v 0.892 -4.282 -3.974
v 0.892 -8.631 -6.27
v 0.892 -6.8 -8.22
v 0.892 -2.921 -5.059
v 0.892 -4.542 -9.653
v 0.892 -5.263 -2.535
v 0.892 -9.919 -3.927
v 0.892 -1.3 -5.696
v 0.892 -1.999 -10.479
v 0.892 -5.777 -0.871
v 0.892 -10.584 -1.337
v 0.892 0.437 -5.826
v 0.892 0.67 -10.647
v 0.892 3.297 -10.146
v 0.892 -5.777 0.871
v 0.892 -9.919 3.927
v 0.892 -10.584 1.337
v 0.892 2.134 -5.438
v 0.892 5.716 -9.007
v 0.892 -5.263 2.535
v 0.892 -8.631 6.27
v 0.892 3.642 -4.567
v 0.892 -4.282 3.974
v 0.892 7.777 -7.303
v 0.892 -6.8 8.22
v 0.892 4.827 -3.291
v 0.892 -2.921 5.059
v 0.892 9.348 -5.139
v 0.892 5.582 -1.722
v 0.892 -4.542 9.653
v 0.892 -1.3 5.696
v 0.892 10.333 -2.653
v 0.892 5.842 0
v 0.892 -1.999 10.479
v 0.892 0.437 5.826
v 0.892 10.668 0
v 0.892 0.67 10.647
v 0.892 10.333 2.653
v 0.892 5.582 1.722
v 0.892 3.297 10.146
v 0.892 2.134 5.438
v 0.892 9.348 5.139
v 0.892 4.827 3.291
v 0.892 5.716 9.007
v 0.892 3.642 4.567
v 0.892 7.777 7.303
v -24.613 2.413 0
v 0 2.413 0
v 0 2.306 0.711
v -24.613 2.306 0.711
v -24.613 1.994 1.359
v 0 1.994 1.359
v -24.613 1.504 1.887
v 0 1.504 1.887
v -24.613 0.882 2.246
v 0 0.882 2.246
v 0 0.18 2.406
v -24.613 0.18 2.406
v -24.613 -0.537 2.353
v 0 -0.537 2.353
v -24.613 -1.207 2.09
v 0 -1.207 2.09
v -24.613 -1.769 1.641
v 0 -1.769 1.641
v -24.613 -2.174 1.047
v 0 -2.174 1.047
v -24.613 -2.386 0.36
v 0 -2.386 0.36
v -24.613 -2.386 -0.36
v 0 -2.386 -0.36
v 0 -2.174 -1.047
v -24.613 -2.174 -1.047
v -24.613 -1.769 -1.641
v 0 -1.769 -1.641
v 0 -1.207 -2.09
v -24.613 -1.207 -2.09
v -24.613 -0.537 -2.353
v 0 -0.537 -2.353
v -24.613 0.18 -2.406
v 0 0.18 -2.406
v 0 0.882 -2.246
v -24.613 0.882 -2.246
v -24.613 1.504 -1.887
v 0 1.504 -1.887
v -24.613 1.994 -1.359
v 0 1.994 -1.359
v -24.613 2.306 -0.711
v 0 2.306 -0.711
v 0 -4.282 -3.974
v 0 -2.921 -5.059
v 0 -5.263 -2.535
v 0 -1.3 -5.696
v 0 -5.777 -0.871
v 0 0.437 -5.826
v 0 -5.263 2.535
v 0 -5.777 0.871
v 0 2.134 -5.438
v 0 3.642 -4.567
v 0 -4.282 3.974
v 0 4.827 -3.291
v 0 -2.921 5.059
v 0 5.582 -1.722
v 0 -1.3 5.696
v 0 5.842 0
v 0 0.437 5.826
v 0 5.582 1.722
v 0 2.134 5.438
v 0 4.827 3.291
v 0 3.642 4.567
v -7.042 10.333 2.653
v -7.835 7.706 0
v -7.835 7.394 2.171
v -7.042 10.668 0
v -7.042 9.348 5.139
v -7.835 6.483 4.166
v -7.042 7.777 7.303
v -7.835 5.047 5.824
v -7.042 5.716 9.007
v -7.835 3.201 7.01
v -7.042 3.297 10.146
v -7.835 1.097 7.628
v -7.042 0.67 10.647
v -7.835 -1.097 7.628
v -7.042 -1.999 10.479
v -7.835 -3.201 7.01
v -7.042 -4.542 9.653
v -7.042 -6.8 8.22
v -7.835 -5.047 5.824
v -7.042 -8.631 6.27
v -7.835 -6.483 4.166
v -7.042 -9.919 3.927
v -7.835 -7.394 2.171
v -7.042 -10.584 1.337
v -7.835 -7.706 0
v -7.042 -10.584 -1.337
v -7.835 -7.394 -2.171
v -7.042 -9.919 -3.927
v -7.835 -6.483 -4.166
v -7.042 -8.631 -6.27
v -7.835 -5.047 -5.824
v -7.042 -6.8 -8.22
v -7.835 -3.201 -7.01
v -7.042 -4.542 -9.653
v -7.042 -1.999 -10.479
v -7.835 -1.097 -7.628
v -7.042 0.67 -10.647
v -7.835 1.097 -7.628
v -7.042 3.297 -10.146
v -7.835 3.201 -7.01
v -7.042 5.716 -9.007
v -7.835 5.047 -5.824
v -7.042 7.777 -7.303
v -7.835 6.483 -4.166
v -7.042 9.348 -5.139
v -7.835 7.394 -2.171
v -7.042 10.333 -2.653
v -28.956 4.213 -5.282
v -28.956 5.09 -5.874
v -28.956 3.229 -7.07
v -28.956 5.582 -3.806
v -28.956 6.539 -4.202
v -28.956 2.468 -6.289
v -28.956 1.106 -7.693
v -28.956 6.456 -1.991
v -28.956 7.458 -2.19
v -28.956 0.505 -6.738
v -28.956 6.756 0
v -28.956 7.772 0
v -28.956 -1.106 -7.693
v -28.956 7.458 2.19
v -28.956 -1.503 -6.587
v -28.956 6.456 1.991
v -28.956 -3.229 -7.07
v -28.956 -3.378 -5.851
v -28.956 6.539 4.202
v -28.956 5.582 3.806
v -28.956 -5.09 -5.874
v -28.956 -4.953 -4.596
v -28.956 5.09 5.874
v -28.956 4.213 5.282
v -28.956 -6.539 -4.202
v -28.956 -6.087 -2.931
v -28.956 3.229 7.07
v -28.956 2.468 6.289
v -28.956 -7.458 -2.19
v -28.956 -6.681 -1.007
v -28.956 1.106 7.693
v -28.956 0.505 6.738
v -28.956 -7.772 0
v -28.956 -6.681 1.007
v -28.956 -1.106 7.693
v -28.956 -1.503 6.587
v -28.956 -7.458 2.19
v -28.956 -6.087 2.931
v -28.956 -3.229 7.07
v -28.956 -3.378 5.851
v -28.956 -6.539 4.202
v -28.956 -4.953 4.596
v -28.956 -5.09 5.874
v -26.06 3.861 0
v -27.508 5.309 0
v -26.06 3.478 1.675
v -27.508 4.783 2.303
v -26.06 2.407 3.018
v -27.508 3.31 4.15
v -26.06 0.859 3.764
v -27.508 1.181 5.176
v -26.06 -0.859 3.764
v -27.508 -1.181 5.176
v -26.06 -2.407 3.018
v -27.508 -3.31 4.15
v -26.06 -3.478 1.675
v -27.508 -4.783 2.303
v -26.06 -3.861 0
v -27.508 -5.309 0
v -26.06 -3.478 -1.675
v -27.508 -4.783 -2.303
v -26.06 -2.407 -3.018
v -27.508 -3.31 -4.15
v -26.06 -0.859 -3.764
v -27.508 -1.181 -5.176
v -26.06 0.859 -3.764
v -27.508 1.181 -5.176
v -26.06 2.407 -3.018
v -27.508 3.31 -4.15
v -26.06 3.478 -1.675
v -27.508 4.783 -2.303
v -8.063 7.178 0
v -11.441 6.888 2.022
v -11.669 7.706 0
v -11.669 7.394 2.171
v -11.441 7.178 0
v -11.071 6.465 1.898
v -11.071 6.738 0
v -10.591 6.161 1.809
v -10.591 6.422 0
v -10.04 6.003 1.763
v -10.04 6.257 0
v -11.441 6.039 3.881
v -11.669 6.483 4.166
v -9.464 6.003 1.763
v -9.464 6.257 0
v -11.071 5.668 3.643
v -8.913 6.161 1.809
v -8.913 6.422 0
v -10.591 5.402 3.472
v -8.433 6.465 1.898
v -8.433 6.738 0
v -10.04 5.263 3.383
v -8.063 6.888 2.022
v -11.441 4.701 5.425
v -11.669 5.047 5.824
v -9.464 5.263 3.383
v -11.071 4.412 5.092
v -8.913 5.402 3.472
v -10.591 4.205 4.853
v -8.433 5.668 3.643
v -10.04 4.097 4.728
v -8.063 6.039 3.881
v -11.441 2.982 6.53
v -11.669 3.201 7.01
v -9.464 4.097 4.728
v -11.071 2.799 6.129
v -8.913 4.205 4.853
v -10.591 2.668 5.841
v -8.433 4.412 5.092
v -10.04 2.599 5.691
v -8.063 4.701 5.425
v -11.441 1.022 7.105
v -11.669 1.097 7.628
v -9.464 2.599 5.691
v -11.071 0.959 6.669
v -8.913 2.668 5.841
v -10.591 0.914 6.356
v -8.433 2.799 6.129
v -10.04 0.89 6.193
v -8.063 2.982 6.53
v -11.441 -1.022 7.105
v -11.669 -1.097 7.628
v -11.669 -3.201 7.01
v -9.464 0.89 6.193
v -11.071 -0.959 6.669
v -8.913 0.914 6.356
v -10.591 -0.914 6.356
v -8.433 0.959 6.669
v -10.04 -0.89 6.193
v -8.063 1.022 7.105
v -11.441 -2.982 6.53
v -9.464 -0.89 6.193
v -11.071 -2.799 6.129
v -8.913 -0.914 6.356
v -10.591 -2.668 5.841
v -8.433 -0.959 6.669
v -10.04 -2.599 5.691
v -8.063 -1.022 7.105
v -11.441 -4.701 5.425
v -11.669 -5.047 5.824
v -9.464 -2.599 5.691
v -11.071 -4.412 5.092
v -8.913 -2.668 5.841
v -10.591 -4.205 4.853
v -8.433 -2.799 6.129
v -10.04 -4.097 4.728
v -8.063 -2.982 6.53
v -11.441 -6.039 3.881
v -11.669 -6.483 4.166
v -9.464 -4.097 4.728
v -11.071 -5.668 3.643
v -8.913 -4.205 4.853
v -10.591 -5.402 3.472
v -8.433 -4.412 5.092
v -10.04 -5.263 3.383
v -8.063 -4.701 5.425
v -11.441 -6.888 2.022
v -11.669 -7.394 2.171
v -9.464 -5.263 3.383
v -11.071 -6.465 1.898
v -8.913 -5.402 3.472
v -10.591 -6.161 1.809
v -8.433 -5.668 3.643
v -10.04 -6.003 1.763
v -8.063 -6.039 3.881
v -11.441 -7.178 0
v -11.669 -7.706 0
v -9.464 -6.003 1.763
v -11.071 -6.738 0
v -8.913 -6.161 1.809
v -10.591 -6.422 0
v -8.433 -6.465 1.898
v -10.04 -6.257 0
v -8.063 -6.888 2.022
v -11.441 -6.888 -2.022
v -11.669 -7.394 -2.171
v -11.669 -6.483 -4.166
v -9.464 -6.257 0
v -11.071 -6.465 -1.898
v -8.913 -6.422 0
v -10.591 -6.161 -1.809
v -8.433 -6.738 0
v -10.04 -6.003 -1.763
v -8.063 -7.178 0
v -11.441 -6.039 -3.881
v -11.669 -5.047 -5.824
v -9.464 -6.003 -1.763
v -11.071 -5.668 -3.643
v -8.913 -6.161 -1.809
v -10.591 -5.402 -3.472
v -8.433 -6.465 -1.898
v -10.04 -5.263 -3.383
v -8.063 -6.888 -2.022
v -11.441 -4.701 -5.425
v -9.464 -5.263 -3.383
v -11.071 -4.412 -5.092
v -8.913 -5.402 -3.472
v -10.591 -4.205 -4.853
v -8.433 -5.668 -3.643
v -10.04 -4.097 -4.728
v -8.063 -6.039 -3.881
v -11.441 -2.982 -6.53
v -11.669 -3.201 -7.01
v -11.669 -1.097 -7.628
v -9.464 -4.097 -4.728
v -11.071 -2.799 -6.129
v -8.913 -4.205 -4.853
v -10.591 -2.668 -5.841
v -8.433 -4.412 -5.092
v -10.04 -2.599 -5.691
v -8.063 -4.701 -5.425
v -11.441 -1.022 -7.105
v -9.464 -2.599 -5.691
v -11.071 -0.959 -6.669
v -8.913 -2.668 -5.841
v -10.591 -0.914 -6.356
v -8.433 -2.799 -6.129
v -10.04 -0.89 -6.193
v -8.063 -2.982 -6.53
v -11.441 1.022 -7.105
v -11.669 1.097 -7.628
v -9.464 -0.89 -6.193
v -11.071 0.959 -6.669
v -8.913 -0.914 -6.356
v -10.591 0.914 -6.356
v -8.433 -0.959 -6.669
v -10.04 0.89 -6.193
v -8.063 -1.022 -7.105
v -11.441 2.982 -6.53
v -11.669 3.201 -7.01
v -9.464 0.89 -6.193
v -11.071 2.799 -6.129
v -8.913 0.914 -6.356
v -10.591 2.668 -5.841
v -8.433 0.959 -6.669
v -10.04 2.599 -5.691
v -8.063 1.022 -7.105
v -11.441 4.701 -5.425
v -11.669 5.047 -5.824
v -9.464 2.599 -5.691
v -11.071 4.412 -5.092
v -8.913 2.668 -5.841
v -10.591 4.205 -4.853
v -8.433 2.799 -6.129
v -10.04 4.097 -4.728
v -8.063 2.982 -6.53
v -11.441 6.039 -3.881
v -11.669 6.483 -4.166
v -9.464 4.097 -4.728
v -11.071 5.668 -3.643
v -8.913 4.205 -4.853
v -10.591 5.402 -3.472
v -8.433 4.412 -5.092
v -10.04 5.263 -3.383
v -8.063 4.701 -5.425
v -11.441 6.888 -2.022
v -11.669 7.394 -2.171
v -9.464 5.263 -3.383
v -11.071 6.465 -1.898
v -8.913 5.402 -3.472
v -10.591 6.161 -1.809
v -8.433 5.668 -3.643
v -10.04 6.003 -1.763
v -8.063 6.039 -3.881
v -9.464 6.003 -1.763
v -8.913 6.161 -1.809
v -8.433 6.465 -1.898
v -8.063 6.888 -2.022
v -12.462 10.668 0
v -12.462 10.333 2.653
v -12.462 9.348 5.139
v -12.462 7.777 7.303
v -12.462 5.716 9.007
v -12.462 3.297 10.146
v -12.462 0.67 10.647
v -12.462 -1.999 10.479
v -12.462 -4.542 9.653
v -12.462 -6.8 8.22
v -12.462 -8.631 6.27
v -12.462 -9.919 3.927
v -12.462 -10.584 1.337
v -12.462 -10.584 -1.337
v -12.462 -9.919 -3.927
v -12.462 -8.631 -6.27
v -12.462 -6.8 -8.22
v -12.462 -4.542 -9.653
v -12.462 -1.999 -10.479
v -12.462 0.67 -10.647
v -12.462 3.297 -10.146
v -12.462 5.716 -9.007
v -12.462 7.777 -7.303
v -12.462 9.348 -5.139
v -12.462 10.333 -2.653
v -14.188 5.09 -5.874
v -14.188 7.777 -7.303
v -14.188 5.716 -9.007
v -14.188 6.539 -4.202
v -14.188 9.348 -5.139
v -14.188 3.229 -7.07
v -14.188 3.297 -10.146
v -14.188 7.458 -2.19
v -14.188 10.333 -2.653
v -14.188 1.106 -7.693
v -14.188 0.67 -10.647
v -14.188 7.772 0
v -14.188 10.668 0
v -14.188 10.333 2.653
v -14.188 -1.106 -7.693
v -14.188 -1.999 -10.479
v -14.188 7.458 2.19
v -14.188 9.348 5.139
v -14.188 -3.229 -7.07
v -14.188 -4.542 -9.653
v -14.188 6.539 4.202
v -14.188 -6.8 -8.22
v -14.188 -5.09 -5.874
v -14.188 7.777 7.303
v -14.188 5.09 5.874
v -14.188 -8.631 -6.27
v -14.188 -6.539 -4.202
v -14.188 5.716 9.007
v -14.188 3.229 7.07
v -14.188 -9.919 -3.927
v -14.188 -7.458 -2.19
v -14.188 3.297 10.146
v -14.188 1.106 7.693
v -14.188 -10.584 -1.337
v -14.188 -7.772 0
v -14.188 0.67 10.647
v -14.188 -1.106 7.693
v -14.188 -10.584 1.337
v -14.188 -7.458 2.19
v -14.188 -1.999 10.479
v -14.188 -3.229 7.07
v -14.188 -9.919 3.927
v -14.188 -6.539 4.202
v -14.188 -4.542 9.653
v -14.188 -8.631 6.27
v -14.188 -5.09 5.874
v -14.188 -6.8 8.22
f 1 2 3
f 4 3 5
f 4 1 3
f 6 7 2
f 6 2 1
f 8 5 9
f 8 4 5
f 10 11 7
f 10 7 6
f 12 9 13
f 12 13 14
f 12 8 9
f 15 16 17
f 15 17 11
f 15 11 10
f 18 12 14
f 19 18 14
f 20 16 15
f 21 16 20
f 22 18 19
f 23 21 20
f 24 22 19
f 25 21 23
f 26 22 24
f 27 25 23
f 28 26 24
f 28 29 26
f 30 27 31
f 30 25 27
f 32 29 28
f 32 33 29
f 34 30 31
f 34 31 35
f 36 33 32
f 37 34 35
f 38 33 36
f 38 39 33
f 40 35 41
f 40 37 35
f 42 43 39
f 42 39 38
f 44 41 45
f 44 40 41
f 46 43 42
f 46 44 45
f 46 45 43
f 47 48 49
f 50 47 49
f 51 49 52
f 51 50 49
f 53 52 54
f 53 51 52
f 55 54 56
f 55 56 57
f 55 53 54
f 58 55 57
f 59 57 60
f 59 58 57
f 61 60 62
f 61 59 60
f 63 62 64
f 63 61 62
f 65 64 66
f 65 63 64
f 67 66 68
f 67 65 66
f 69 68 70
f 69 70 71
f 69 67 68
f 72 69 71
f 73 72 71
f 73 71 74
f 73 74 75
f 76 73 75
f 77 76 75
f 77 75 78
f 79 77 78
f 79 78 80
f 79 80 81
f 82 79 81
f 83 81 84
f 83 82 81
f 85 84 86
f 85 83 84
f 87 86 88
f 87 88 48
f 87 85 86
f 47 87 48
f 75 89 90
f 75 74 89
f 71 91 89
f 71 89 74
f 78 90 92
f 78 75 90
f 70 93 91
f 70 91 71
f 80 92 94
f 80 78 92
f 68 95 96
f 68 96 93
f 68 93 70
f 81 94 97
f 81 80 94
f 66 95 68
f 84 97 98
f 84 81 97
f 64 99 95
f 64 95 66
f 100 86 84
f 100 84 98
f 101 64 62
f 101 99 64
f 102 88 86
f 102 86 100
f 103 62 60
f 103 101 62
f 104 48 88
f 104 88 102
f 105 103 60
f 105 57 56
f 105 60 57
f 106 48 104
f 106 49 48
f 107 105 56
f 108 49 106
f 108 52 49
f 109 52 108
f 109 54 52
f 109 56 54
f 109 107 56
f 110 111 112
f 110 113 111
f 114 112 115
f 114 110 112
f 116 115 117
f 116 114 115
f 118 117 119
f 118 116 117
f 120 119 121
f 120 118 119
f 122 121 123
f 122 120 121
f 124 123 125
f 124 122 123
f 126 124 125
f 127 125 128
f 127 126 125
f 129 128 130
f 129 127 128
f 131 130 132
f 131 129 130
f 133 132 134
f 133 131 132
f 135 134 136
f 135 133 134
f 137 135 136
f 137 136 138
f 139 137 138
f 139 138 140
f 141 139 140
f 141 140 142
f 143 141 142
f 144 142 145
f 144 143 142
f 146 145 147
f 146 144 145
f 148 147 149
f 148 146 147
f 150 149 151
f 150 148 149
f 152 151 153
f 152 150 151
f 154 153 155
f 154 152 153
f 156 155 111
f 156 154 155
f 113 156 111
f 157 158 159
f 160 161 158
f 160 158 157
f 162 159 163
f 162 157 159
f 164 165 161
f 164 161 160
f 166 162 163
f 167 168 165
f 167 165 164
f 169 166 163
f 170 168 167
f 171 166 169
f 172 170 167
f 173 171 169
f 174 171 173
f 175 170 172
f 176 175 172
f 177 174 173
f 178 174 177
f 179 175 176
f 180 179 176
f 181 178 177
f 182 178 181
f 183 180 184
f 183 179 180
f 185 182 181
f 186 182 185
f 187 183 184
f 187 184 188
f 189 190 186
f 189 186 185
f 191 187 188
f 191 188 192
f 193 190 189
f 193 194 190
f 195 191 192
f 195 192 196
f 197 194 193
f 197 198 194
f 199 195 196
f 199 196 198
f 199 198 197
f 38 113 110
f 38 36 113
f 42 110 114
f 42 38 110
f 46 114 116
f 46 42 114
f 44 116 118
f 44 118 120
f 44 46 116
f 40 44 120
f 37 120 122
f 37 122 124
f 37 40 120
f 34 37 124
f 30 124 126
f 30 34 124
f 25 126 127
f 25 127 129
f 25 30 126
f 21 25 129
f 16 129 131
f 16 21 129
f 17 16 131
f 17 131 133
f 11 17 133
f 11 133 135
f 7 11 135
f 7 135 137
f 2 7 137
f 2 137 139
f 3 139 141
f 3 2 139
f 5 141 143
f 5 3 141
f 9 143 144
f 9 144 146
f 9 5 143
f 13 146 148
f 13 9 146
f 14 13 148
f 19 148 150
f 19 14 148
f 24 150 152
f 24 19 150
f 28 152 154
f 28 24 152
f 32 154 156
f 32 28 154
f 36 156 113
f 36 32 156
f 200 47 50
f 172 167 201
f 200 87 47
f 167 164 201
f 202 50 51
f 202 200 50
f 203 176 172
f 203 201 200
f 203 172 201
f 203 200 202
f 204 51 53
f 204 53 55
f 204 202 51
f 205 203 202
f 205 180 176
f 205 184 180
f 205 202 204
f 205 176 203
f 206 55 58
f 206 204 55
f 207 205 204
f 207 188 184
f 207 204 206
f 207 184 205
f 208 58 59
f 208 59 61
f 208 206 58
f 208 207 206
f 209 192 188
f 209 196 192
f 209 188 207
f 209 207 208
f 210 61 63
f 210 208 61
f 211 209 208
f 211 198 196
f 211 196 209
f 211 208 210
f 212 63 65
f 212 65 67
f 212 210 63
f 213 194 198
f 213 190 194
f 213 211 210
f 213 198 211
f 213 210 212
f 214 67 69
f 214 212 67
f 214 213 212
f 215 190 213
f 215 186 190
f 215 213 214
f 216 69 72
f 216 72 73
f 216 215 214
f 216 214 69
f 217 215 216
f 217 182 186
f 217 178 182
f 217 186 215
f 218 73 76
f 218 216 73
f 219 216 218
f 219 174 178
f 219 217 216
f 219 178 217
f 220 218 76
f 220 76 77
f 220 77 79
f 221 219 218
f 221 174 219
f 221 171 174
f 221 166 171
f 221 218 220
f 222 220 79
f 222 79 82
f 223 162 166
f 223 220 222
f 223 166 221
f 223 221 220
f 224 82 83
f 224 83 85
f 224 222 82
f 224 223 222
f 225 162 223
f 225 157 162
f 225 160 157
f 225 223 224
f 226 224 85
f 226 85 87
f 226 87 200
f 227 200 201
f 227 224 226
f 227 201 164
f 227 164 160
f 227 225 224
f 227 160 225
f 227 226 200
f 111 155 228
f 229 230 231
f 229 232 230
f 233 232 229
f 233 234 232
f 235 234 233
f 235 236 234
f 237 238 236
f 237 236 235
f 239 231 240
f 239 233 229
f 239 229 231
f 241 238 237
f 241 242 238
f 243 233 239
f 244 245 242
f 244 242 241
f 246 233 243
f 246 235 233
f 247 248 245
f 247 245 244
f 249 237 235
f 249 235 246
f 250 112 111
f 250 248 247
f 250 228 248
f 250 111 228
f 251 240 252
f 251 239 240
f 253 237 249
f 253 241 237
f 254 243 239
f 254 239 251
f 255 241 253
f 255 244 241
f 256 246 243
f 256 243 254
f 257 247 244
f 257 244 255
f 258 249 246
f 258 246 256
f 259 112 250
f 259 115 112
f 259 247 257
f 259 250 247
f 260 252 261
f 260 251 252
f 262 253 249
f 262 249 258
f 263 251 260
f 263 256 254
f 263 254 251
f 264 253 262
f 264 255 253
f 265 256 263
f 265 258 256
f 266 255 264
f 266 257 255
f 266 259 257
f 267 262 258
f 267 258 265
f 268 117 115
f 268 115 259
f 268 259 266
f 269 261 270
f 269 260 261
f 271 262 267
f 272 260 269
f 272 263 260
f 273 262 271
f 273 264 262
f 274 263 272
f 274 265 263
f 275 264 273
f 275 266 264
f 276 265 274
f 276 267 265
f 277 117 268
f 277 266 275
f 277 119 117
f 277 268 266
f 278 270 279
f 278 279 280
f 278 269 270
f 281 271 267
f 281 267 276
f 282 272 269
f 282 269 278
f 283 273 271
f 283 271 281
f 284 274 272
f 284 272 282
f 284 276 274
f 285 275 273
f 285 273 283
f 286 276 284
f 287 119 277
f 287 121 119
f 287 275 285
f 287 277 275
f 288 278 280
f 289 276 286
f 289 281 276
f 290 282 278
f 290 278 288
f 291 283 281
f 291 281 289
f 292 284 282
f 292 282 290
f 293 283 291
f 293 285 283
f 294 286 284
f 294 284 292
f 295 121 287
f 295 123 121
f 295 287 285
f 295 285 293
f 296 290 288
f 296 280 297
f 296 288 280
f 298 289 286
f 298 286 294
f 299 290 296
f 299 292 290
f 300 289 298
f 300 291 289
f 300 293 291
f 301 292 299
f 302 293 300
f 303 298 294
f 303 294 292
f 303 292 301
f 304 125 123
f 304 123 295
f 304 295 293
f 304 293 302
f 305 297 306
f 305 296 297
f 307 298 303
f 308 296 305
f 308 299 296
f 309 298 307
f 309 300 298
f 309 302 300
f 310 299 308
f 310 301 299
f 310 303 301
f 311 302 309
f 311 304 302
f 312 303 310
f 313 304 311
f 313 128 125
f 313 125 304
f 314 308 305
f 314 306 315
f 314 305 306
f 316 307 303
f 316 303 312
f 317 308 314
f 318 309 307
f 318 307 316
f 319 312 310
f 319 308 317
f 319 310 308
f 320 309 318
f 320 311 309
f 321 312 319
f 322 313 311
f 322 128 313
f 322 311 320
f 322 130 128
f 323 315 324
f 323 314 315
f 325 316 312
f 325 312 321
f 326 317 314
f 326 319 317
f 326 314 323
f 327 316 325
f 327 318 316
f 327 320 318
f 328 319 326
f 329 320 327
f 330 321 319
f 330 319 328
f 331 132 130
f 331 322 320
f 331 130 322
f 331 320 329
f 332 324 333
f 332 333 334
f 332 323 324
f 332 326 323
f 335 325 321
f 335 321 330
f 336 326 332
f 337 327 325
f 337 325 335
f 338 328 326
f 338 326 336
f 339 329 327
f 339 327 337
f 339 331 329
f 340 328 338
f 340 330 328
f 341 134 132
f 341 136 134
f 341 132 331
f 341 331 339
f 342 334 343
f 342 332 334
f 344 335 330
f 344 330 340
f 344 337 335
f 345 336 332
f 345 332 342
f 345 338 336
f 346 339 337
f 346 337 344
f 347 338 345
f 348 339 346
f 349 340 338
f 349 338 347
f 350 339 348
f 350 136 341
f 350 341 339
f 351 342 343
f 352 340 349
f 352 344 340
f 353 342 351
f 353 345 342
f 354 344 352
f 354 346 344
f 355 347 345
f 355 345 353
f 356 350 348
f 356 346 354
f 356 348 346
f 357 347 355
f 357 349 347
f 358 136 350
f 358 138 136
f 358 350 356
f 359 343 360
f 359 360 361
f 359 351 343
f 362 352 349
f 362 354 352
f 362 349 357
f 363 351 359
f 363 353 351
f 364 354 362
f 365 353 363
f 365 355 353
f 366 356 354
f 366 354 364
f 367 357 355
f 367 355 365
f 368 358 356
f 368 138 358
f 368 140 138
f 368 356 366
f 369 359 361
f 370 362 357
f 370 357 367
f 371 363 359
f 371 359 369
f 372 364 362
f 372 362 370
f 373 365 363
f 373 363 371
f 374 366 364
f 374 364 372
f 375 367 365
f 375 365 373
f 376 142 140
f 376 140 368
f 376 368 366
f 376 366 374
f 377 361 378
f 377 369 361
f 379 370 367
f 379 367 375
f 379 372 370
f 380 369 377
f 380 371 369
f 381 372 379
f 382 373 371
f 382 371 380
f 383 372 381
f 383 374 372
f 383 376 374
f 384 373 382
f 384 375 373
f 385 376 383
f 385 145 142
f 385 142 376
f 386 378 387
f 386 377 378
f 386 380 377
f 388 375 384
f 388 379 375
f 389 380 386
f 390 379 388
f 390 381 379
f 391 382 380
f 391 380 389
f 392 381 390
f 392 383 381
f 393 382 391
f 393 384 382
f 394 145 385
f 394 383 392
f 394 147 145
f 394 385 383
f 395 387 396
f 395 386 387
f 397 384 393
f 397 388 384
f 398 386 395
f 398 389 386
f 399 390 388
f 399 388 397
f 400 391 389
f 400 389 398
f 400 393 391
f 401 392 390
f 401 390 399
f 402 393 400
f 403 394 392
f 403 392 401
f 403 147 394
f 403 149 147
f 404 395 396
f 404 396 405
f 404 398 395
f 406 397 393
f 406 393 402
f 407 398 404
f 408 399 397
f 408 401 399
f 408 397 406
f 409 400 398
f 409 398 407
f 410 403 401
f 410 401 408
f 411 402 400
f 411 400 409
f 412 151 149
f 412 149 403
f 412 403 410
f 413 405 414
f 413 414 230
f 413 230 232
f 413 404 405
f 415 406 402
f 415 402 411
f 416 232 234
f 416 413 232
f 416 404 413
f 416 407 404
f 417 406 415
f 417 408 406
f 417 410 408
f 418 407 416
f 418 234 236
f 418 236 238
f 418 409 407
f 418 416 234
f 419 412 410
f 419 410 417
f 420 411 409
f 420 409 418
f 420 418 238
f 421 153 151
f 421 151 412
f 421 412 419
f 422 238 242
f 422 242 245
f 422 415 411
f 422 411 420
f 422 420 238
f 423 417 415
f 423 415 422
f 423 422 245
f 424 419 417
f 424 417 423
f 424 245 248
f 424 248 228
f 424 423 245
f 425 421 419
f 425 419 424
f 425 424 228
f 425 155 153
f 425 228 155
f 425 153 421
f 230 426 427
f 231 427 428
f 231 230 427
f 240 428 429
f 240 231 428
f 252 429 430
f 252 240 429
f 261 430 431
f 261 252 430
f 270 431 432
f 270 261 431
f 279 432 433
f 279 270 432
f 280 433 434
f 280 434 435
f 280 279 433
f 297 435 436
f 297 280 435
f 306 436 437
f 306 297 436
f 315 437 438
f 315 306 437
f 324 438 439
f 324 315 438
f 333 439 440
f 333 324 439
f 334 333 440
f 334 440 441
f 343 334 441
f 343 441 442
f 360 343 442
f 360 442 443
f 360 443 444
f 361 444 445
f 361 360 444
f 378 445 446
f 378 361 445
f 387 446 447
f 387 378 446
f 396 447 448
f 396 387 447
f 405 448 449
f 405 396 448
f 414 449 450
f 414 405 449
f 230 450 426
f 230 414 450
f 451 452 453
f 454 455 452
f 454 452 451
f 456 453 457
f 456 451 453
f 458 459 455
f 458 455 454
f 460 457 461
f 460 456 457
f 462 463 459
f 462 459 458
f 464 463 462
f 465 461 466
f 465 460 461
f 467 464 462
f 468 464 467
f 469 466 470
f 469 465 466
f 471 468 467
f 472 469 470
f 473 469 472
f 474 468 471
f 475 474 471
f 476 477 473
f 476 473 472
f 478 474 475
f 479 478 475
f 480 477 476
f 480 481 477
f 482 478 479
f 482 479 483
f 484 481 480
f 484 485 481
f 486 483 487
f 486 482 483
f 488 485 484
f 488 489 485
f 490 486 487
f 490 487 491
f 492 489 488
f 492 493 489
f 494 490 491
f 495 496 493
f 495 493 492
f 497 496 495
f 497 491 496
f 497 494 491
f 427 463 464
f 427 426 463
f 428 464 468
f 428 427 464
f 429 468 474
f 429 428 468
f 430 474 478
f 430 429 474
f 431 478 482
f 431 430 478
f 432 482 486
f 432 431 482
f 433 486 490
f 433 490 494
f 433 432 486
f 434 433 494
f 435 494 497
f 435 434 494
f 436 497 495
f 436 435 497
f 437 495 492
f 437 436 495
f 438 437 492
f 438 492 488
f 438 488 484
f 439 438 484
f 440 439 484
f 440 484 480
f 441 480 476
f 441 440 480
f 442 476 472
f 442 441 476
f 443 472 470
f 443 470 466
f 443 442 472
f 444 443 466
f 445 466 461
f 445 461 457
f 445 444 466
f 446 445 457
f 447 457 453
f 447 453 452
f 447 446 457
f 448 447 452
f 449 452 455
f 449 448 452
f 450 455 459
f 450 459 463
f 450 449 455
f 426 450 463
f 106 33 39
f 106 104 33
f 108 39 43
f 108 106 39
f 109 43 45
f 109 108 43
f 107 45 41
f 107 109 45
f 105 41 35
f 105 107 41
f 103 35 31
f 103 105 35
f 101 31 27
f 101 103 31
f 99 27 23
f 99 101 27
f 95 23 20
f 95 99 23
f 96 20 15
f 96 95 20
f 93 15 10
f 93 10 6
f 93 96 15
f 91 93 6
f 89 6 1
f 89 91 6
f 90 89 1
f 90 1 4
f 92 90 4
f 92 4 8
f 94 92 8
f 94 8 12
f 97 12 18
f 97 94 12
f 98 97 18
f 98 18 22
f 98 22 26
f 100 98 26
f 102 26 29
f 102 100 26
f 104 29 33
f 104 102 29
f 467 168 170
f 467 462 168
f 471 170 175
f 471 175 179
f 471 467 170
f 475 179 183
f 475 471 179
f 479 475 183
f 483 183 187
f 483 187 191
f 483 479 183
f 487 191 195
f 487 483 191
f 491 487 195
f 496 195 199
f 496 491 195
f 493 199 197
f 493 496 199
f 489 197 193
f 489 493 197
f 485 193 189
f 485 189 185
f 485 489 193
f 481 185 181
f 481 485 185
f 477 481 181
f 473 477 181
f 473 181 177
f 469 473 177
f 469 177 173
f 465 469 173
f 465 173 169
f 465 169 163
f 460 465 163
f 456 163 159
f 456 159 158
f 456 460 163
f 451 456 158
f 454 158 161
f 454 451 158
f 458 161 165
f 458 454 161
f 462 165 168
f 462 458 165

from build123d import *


with BuildPart() as part:
    # Sketch1 → Revolve1 (revolve)
    with BuildSketch(Plane.XY):
        with BuildLine():
            Line((-7.83533025, 7.706480957), (-7.041793614, 10.668))
            Line((-7.041793614, 10.668), (0.892, 10.668))
            Line((0.892, 10.668), (0.892, 5.842))
            Line((0.892, 5.842), (0, 5.842))
            Line((0, 5.842), (0, 2.413))
            Line((0, 2.413), (-24.6126, 2.413))
            Line((-24.6126, 2.413), (-28.956, 6.7564))
            Line((-28.956, 6.7564), (-28.956, 7.7724))
            Line((-28.956, 7.7724), (-14.188119198, 7.7724))
            Line((-14.188119198, 7.7724), (-14.188119198, 10.668))
            Line((-14.188119198, 10.668), (-12.462385009, 10.668))
            Line((-12.462385009, 10.668), (-11.668848373, 7.706480957))
            ThreePointArc((-11.668848373, 7.706480957), (-9.752089311, 6.2357), (-7.83533025, 7.706480957))
        make_face()
    revolve(axis=Axis((-22.598839253, 0, 0), (1, 0, 0)))


solid = part.part
